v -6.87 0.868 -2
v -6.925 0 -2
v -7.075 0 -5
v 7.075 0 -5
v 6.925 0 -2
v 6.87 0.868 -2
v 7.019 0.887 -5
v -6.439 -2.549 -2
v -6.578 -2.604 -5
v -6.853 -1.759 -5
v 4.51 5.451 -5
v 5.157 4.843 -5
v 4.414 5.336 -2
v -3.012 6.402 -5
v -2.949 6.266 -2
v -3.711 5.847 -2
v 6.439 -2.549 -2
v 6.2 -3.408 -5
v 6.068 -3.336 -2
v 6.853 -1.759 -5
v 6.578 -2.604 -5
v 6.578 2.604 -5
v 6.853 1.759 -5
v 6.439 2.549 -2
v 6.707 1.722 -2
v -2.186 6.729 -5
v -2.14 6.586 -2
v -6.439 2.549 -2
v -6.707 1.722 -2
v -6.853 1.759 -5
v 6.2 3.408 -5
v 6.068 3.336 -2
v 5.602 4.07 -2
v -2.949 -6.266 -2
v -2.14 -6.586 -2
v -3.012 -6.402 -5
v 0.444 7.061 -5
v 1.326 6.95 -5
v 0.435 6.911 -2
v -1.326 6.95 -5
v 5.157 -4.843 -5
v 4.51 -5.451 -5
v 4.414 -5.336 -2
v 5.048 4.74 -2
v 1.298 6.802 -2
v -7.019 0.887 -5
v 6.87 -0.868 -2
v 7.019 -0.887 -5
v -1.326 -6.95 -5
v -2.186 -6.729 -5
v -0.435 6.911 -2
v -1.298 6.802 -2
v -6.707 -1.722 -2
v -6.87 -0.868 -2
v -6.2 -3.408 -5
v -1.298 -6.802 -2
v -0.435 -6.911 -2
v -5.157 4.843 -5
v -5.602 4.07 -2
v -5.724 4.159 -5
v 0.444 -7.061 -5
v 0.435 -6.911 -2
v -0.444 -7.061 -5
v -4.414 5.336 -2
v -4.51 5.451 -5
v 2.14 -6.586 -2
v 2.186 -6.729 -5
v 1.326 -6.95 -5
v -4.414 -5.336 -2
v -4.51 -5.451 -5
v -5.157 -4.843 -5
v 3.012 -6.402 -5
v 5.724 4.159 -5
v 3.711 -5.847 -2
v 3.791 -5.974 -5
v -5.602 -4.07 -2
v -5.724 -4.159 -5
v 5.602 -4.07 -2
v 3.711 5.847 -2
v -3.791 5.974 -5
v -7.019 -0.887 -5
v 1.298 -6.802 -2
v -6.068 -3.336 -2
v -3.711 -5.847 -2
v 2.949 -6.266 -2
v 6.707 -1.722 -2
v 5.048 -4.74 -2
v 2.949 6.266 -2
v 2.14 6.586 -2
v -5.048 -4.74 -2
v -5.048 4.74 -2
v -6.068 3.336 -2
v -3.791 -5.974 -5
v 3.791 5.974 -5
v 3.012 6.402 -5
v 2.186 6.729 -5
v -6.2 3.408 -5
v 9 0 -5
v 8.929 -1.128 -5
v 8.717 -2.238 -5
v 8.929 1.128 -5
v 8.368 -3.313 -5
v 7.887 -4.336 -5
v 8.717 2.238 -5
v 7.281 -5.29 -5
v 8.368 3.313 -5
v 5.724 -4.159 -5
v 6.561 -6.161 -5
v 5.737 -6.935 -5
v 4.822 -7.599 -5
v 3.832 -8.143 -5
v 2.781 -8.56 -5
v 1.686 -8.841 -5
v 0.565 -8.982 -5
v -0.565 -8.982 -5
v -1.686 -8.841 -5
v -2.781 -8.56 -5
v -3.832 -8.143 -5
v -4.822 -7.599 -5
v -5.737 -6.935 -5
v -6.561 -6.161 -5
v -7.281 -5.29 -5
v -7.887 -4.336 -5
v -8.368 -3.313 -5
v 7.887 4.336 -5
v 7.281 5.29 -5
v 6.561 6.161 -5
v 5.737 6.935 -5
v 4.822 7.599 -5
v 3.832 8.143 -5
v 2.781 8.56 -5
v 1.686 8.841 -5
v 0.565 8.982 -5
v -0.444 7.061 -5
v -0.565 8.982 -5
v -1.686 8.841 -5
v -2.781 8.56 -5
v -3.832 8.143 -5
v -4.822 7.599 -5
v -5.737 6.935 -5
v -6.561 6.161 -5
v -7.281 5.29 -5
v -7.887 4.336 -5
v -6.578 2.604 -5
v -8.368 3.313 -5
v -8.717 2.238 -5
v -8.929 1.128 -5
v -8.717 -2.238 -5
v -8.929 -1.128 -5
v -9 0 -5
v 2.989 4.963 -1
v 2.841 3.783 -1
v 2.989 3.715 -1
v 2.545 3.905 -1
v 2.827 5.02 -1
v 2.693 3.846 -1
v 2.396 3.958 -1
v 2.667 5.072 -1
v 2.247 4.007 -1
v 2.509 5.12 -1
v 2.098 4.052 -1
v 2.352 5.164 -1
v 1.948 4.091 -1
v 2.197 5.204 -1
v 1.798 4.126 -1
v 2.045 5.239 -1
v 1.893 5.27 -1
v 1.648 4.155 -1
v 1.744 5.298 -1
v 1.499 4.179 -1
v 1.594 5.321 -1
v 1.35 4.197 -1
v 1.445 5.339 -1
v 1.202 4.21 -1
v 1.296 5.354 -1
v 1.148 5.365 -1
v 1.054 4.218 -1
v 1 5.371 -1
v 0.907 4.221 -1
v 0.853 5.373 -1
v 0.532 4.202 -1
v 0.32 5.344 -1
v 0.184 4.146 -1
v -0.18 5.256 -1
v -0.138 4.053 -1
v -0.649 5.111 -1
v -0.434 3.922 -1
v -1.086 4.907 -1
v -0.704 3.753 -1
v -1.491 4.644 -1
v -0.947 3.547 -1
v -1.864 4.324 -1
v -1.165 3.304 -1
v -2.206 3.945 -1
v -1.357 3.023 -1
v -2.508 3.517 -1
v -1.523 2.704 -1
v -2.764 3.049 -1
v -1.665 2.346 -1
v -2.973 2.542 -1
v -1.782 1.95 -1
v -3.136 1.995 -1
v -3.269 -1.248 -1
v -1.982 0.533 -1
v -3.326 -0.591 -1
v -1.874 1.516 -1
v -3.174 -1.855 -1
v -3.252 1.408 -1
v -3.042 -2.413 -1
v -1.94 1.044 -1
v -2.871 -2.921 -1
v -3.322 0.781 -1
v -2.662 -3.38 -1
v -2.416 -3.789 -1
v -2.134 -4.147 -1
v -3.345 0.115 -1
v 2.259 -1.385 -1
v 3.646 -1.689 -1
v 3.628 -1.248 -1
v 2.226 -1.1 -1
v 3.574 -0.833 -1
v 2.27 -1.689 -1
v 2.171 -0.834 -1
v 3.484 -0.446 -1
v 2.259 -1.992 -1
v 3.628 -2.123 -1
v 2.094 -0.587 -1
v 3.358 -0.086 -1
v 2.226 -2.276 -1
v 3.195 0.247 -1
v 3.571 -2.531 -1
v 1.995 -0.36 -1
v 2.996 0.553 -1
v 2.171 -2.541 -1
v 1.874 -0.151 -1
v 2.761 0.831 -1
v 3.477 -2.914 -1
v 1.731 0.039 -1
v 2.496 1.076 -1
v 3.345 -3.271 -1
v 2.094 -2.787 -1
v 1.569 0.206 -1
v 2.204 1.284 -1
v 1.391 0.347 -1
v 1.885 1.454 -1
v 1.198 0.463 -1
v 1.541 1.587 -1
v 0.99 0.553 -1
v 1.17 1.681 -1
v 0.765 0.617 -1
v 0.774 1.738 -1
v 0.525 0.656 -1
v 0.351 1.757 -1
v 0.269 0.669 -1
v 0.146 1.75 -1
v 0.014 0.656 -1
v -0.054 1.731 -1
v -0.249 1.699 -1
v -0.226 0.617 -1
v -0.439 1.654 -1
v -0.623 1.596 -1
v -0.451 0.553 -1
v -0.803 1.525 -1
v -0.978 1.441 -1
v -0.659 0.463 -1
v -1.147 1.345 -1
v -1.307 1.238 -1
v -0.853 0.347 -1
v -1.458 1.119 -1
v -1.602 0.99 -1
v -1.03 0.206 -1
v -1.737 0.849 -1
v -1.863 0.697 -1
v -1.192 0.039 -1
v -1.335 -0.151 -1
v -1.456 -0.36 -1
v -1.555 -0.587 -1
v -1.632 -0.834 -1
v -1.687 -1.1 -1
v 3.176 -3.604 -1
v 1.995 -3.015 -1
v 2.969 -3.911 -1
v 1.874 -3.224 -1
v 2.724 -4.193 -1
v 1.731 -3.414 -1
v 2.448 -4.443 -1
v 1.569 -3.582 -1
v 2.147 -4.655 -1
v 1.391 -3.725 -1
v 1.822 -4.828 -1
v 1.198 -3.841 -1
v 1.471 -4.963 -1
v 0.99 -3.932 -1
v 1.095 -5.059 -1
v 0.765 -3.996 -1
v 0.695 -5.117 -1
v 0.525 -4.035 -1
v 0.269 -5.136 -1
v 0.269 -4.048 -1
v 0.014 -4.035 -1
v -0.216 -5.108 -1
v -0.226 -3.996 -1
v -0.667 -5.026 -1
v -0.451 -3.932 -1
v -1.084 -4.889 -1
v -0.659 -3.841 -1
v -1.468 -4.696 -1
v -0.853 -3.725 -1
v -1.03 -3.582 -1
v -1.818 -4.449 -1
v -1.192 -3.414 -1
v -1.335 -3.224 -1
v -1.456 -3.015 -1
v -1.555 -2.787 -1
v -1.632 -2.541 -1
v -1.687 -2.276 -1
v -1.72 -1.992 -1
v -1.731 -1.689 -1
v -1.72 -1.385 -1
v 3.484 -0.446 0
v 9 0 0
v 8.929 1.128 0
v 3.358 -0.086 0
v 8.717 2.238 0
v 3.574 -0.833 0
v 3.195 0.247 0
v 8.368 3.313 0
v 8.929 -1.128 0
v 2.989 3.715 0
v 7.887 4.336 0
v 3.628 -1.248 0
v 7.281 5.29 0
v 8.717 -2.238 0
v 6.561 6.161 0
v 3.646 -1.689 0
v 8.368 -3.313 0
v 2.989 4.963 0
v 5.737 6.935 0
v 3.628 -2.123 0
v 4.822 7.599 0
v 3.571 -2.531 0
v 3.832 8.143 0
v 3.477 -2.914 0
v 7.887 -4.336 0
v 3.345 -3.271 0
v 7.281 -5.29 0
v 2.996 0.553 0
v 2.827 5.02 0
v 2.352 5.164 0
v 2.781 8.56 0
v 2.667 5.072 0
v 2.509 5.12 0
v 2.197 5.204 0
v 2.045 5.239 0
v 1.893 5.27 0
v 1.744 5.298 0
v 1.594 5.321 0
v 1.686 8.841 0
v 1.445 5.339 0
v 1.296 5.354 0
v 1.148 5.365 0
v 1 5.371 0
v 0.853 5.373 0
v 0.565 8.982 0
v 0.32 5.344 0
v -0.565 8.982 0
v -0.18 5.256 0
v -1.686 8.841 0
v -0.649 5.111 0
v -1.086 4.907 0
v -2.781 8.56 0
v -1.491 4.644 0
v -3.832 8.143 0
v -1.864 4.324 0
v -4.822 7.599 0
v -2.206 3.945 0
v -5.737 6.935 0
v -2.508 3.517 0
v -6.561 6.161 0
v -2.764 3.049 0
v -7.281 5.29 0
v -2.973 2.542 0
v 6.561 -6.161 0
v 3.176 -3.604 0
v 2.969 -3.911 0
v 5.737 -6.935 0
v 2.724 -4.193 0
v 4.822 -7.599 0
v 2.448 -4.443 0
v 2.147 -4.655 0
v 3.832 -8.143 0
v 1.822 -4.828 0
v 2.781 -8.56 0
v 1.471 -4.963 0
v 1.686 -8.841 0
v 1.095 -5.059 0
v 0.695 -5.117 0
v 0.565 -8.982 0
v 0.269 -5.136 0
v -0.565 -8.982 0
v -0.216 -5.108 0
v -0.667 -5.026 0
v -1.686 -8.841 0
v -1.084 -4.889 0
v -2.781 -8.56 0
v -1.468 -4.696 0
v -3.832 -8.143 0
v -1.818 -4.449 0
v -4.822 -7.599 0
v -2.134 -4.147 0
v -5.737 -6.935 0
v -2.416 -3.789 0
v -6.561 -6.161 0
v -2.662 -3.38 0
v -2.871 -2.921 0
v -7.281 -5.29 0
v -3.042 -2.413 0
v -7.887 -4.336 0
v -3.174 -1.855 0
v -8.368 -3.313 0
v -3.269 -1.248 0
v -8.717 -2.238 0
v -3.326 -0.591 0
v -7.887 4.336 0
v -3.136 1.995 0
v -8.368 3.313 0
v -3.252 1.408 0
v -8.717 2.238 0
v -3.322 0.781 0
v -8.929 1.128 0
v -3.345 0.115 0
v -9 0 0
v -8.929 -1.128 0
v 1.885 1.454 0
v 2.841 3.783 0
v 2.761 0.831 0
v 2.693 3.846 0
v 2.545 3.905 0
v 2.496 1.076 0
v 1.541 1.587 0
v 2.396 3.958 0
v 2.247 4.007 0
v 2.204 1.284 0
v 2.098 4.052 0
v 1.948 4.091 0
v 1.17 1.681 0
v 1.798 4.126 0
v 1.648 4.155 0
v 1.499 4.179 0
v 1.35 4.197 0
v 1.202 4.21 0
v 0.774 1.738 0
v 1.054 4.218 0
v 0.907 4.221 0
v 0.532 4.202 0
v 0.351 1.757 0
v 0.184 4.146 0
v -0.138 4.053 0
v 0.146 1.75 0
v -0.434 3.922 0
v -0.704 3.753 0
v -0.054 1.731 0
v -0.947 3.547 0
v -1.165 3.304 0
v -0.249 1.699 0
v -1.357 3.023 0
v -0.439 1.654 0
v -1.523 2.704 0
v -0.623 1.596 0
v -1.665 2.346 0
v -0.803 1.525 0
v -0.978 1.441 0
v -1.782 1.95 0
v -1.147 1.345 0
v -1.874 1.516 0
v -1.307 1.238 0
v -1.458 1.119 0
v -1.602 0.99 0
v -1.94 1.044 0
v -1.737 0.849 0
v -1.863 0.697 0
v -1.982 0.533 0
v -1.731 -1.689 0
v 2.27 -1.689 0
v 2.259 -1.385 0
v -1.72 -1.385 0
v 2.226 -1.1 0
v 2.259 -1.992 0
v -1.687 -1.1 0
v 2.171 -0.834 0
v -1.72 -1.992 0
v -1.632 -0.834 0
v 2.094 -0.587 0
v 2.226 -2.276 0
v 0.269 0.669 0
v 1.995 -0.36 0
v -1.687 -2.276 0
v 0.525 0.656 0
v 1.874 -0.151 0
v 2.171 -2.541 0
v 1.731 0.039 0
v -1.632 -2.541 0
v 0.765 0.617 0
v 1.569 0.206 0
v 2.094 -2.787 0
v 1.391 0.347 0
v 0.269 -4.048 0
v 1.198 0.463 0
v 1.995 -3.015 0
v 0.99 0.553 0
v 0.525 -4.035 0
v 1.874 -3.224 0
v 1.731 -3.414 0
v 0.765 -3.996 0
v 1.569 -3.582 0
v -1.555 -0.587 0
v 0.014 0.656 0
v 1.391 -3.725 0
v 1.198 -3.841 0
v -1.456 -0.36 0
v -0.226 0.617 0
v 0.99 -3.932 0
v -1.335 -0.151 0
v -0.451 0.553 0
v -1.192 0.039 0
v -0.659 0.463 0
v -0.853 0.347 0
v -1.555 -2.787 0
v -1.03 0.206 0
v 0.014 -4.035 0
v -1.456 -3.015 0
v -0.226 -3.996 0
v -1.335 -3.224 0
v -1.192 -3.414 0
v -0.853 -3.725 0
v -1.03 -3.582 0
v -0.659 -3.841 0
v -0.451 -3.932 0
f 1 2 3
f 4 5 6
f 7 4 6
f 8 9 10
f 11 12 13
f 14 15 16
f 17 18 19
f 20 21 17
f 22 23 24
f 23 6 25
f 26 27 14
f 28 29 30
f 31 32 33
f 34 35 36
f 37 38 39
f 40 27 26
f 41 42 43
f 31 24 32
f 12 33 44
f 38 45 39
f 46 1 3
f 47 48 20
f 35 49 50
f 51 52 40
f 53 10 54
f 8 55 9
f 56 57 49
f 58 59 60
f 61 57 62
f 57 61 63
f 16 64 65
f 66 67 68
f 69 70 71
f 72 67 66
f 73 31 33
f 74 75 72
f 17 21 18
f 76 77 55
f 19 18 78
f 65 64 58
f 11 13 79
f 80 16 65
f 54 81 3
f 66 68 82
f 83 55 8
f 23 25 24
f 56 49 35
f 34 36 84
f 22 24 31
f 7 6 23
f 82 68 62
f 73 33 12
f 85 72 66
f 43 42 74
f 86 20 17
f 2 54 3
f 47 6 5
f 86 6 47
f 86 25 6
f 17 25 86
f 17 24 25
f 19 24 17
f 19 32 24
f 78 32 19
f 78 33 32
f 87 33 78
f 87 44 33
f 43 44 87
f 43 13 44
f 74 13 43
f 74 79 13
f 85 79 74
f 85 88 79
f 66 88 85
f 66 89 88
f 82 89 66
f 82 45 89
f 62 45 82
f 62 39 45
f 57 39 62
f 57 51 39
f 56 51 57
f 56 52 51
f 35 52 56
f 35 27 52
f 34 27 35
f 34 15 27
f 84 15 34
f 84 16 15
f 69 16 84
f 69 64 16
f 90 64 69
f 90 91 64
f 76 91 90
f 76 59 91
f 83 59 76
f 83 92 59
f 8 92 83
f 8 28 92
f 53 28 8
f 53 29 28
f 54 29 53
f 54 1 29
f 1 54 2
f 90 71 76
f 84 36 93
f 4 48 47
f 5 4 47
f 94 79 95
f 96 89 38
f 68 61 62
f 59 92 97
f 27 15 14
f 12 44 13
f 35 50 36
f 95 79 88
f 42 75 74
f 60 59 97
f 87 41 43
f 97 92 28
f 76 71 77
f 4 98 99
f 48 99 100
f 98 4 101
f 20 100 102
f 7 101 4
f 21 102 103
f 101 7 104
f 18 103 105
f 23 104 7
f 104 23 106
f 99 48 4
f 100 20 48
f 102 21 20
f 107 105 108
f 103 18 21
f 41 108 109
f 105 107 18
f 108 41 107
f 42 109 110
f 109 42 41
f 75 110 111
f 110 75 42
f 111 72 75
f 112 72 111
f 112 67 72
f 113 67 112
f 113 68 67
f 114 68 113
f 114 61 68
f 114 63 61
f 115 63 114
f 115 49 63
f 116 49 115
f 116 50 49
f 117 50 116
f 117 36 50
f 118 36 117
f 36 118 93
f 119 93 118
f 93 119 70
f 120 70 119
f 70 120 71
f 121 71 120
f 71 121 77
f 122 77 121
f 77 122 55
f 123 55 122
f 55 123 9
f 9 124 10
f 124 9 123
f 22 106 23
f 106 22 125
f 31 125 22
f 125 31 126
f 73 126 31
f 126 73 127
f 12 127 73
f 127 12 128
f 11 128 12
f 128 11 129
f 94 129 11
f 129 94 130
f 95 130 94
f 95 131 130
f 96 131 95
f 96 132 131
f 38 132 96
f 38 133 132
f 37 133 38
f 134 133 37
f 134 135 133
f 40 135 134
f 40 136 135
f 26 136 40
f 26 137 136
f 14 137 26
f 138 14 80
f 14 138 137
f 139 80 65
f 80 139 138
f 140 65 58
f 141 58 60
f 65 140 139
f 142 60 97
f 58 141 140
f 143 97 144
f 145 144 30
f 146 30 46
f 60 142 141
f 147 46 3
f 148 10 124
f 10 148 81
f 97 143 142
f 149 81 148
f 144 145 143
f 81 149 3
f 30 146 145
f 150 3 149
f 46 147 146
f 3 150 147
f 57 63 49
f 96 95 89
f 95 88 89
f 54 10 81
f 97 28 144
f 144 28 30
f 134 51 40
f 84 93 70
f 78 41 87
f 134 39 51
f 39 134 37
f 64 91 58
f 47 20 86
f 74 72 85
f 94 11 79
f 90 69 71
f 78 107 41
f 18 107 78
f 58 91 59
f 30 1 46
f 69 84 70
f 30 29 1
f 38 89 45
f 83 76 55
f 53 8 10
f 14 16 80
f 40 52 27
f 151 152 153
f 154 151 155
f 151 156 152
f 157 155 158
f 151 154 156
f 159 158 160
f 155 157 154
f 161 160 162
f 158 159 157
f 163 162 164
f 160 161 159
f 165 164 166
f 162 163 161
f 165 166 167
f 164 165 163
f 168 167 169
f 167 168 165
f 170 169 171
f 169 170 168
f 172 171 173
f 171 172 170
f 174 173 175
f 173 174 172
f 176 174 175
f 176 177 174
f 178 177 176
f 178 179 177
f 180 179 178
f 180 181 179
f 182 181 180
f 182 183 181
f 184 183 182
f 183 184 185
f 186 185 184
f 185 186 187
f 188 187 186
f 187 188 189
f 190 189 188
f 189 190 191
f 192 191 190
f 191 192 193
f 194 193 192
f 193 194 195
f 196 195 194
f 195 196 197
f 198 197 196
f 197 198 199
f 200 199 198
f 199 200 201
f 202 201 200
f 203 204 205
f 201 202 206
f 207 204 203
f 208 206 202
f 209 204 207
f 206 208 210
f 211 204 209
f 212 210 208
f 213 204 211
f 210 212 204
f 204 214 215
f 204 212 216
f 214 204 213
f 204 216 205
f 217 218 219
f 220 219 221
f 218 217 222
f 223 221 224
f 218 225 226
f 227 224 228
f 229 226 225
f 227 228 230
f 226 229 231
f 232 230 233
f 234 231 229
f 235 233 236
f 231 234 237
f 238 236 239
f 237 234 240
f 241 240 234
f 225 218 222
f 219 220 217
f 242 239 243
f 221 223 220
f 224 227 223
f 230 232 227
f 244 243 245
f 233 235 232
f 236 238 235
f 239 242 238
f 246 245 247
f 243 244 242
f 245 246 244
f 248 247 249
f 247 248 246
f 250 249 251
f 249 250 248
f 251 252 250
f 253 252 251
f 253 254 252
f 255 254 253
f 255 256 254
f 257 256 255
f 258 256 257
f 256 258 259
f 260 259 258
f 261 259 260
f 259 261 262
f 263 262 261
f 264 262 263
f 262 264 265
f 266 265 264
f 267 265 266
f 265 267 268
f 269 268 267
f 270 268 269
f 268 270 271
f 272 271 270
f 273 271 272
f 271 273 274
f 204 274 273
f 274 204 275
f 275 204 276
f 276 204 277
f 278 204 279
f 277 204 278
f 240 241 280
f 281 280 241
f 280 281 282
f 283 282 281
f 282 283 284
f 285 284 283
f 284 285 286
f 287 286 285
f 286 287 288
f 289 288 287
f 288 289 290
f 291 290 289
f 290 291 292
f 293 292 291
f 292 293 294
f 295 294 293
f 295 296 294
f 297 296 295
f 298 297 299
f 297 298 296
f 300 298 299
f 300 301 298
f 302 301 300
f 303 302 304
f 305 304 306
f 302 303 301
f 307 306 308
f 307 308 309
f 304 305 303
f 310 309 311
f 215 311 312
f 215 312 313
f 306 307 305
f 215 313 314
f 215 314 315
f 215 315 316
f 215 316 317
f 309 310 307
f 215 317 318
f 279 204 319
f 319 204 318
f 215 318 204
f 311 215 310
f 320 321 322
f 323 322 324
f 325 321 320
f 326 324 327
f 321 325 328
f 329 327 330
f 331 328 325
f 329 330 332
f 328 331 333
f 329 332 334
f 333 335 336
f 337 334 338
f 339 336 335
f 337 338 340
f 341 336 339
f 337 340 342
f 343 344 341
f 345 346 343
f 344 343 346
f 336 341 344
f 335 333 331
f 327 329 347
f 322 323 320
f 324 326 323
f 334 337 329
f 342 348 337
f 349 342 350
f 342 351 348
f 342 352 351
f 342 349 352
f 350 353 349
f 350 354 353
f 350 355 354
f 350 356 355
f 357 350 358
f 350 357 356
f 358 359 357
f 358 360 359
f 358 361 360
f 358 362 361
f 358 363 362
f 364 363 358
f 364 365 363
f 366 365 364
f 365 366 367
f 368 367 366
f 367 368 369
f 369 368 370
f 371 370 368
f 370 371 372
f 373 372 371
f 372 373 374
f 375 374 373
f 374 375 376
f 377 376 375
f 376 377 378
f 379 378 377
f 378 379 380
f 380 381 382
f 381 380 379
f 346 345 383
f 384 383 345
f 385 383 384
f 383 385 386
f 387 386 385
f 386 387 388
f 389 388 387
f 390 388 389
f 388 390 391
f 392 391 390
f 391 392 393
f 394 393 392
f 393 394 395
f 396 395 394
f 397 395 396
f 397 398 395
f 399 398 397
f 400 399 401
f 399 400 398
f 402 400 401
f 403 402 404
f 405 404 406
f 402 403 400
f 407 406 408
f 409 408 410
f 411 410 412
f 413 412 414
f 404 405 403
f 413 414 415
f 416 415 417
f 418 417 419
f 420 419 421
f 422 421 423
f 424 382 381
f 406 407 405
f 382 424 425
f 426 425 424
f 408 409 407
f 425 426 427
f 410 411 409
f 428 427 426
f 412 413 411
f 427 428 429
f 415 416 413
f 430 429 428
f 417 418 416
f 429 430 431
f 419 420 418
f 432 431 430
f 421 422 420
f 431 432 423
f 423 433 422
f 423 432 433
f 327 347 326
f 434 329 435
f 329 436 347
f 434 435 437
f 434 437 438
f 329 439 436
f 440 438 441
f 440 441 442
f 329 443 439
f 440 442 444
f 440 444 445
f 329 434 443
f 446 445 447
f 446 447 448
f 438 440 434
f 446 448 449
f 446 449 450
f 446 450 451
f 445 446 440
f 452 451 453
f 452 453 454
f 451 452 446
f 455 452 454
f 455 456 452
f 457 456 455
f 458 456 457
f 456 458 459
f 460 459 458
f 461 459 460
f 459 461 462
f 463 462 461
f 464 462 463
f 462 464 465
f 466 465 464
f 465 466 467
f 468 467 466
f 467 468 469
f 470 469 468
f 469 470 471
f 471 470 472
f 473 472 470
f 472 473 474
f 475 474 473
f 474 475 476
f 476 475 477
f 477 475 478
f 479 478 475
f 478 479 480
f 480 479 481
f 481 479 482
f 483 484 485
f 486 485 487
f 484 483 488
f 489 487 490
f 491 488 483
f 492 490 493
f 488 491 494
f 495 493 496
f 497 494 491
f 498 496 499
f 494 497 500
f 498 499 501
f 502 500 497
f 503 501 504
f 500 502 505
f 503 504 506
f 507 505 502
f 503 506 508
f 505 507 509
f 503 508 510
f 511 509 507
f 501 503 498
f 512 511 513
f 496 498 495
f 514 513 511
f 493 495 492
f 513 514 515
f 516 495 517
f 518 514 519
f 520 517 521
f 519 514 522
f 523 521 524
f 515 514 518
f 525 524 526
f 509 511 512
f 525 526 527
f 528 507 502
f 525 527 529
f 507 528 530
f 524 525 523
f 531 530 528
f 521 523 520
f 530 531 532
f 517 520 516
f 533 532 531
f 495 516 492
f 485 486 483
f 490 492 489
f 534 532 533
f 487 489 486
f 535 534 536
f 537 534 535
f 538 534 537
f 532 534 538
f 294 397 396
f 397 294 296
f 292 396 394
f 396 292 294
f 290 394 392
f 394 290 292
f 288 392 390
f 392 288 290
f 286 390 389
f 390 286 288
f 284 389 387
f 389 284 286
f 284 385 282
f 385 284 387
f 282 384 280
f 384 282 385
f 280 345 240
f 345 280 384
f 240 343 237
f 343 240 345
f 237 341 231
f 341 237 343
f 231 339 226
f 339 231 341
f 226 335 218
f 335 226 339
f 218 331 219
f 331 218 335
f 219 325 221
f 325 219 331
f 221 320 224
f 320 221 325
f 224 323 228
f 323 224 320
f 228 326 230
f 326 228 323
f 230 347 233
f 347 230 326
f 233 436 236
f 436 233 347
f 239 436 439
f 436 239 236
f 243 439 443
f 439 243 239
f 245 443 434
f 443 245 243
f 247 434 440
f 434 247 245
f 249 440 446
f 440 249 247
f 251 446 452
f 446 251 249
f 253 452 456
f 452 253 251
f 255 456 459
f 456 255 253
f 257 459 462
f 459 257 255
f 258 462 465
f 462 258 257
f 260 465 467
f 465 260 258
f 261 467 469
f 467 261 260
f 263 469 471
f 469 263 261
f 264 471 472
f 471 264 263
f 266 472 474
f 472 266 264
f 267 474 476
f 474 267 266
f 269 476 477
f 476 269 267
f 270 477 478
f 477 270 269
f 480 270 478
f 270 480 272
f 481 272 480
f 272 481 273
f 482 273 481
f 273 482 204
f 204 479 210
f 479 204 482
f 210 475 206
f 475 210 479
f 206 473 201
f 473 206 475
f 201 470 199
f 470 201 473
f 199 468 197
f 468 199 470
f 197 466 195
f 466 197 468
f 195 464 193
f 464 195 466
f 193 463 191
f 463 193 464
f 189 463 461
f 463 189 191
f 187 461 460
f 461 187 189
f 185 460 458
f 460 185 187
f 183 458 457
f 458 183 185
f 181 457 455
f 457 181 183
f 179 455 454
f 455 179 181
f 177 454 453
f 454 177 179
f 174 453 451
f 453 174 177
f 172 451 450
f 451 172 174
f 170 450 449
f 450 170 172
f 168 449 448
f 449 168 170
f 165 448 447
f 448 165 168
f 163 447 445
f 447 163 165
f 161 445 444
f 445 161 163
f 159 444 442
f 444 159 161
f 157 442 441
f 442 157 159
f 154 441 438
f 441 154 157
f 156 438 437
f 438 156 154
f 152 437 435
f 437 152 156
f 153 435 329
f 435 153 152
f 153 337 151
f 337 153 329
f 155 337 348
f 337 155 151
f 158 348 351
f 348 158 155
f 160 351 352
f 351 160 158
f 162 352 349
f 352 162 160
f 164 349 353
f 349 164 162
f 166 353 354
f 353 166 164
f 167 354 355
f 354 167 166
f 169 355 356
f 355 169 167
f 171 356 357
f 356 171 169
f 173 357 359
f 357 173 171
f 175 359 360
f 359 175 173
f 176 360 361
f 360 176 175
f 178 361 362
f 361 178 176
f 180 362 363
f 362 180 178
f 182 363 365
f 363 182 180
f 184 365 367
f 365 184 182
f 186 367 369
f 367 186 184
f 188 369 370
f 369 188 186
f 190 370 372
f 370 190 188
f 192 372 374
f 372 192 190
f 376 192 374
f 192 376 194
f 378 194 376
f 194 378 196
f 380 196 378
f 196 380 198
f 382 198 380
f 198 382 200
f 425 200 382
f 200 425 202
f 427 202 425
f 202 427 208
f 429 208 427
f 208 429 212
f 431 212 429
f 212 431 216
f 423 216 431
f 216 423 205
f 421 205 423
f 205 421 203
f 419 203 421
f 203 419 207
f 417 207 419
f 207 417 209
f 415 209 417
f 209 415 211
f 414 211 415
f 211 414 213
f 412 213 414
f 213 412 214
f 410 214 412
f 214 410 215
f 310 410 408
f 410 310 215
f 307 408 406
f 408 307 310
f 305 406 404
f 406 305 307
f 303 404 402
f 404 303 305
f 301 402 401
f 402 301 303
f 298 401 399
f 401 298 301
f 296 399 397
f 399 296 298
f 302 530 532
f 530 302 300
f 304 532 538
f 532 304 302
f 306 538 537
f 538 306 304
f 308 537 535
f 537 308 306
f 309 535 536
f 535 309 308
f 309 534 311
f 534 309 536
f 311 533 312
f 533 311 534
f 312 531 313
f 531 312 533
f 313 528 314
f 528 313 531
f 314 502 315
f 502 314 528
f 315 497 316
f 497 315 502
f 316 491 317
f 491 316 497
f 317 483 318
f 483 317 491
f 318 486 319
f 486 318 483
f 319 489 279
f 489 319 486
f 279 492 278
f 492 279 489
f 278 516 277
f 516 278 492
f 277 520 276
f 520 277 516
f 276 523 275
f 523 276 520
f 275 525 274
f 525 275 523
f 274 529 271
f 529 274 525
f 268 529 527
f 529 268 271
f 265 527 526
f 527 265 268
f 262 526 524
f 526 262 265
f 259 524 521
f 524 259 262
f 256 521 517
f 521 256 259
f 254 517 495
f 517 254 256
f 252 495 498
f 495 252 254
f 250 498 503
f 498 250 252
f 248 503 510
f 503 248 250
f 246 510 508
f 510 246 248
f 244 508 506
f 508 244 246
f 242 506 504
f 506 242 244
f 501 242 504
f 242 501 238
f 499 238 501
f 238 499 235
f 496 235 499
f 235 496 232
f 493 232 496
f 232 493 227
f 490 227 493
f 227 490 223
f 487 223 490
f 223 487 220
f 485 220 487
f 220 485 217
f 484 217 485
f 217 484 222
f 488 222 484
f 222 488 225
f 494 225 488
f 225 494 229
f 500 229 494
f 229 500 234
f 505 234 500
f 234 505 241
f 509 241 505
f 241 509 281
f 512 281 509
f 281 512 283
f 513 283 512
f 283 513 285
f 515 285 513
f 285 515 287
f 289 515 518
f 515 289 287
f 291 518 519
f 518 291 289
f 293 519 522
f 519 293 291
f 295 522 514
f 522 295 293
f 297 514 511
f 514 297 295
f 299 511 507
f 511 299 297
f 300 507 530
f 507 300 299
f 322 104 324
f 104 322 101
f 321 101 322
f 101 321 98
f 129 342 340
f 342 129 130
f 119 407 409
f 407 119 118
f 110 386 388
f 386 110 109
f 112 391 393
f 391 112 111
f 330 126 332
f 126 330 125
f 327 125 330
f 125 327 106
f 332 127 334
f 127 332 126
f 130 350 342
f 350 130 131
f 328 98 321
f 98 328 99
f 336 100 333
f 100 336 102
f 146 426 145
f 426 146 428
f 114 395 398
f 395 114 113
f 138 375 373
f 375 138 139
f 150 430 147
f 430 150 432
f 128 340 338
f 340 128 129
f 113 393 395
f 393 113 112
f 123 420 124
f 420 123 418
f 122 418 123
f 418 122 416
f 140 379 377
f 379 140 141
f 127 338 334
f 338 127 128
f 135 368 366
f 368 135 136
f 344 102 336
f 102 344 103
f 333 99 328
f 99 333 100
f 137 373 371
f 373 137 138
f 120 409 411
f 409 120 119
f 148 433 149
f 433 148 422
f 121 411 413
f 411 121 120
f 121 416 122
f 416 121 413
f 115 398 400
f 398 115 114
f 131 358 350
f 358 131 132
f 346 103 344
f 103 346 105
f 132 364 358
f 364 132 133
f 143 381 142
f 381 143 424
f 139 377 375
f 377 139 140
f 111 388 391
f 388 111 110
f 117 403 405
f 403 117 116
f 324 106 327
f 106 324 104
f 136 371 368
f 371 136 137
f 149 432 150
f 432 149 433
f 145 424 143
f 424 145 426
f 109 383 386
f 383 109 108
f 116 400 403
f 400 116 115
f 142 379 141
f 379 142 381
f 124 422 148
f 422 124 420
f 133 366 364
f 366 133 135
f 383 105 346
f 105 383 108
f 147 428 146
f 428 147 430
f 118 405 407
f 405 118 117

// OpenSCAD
$fn = 50;

difference() {
	union() {
		translate(v = [0, 0, -5.0]) {
			cylinder(h = 5, r = 9.0);
		}
	}
	union() {
		#translate(v = [0, 0, -5.0]) {
			cylinder(h = 3, r1 = 7.075, r2 = 6.925);
		}
		translate(v = [0, 0, -1]) {
			linear_extrude(height = 1) {
				text(font = "Impact", halign = "center", size = 10, text = "6", valign = "center");
			}
		}
	}
}
